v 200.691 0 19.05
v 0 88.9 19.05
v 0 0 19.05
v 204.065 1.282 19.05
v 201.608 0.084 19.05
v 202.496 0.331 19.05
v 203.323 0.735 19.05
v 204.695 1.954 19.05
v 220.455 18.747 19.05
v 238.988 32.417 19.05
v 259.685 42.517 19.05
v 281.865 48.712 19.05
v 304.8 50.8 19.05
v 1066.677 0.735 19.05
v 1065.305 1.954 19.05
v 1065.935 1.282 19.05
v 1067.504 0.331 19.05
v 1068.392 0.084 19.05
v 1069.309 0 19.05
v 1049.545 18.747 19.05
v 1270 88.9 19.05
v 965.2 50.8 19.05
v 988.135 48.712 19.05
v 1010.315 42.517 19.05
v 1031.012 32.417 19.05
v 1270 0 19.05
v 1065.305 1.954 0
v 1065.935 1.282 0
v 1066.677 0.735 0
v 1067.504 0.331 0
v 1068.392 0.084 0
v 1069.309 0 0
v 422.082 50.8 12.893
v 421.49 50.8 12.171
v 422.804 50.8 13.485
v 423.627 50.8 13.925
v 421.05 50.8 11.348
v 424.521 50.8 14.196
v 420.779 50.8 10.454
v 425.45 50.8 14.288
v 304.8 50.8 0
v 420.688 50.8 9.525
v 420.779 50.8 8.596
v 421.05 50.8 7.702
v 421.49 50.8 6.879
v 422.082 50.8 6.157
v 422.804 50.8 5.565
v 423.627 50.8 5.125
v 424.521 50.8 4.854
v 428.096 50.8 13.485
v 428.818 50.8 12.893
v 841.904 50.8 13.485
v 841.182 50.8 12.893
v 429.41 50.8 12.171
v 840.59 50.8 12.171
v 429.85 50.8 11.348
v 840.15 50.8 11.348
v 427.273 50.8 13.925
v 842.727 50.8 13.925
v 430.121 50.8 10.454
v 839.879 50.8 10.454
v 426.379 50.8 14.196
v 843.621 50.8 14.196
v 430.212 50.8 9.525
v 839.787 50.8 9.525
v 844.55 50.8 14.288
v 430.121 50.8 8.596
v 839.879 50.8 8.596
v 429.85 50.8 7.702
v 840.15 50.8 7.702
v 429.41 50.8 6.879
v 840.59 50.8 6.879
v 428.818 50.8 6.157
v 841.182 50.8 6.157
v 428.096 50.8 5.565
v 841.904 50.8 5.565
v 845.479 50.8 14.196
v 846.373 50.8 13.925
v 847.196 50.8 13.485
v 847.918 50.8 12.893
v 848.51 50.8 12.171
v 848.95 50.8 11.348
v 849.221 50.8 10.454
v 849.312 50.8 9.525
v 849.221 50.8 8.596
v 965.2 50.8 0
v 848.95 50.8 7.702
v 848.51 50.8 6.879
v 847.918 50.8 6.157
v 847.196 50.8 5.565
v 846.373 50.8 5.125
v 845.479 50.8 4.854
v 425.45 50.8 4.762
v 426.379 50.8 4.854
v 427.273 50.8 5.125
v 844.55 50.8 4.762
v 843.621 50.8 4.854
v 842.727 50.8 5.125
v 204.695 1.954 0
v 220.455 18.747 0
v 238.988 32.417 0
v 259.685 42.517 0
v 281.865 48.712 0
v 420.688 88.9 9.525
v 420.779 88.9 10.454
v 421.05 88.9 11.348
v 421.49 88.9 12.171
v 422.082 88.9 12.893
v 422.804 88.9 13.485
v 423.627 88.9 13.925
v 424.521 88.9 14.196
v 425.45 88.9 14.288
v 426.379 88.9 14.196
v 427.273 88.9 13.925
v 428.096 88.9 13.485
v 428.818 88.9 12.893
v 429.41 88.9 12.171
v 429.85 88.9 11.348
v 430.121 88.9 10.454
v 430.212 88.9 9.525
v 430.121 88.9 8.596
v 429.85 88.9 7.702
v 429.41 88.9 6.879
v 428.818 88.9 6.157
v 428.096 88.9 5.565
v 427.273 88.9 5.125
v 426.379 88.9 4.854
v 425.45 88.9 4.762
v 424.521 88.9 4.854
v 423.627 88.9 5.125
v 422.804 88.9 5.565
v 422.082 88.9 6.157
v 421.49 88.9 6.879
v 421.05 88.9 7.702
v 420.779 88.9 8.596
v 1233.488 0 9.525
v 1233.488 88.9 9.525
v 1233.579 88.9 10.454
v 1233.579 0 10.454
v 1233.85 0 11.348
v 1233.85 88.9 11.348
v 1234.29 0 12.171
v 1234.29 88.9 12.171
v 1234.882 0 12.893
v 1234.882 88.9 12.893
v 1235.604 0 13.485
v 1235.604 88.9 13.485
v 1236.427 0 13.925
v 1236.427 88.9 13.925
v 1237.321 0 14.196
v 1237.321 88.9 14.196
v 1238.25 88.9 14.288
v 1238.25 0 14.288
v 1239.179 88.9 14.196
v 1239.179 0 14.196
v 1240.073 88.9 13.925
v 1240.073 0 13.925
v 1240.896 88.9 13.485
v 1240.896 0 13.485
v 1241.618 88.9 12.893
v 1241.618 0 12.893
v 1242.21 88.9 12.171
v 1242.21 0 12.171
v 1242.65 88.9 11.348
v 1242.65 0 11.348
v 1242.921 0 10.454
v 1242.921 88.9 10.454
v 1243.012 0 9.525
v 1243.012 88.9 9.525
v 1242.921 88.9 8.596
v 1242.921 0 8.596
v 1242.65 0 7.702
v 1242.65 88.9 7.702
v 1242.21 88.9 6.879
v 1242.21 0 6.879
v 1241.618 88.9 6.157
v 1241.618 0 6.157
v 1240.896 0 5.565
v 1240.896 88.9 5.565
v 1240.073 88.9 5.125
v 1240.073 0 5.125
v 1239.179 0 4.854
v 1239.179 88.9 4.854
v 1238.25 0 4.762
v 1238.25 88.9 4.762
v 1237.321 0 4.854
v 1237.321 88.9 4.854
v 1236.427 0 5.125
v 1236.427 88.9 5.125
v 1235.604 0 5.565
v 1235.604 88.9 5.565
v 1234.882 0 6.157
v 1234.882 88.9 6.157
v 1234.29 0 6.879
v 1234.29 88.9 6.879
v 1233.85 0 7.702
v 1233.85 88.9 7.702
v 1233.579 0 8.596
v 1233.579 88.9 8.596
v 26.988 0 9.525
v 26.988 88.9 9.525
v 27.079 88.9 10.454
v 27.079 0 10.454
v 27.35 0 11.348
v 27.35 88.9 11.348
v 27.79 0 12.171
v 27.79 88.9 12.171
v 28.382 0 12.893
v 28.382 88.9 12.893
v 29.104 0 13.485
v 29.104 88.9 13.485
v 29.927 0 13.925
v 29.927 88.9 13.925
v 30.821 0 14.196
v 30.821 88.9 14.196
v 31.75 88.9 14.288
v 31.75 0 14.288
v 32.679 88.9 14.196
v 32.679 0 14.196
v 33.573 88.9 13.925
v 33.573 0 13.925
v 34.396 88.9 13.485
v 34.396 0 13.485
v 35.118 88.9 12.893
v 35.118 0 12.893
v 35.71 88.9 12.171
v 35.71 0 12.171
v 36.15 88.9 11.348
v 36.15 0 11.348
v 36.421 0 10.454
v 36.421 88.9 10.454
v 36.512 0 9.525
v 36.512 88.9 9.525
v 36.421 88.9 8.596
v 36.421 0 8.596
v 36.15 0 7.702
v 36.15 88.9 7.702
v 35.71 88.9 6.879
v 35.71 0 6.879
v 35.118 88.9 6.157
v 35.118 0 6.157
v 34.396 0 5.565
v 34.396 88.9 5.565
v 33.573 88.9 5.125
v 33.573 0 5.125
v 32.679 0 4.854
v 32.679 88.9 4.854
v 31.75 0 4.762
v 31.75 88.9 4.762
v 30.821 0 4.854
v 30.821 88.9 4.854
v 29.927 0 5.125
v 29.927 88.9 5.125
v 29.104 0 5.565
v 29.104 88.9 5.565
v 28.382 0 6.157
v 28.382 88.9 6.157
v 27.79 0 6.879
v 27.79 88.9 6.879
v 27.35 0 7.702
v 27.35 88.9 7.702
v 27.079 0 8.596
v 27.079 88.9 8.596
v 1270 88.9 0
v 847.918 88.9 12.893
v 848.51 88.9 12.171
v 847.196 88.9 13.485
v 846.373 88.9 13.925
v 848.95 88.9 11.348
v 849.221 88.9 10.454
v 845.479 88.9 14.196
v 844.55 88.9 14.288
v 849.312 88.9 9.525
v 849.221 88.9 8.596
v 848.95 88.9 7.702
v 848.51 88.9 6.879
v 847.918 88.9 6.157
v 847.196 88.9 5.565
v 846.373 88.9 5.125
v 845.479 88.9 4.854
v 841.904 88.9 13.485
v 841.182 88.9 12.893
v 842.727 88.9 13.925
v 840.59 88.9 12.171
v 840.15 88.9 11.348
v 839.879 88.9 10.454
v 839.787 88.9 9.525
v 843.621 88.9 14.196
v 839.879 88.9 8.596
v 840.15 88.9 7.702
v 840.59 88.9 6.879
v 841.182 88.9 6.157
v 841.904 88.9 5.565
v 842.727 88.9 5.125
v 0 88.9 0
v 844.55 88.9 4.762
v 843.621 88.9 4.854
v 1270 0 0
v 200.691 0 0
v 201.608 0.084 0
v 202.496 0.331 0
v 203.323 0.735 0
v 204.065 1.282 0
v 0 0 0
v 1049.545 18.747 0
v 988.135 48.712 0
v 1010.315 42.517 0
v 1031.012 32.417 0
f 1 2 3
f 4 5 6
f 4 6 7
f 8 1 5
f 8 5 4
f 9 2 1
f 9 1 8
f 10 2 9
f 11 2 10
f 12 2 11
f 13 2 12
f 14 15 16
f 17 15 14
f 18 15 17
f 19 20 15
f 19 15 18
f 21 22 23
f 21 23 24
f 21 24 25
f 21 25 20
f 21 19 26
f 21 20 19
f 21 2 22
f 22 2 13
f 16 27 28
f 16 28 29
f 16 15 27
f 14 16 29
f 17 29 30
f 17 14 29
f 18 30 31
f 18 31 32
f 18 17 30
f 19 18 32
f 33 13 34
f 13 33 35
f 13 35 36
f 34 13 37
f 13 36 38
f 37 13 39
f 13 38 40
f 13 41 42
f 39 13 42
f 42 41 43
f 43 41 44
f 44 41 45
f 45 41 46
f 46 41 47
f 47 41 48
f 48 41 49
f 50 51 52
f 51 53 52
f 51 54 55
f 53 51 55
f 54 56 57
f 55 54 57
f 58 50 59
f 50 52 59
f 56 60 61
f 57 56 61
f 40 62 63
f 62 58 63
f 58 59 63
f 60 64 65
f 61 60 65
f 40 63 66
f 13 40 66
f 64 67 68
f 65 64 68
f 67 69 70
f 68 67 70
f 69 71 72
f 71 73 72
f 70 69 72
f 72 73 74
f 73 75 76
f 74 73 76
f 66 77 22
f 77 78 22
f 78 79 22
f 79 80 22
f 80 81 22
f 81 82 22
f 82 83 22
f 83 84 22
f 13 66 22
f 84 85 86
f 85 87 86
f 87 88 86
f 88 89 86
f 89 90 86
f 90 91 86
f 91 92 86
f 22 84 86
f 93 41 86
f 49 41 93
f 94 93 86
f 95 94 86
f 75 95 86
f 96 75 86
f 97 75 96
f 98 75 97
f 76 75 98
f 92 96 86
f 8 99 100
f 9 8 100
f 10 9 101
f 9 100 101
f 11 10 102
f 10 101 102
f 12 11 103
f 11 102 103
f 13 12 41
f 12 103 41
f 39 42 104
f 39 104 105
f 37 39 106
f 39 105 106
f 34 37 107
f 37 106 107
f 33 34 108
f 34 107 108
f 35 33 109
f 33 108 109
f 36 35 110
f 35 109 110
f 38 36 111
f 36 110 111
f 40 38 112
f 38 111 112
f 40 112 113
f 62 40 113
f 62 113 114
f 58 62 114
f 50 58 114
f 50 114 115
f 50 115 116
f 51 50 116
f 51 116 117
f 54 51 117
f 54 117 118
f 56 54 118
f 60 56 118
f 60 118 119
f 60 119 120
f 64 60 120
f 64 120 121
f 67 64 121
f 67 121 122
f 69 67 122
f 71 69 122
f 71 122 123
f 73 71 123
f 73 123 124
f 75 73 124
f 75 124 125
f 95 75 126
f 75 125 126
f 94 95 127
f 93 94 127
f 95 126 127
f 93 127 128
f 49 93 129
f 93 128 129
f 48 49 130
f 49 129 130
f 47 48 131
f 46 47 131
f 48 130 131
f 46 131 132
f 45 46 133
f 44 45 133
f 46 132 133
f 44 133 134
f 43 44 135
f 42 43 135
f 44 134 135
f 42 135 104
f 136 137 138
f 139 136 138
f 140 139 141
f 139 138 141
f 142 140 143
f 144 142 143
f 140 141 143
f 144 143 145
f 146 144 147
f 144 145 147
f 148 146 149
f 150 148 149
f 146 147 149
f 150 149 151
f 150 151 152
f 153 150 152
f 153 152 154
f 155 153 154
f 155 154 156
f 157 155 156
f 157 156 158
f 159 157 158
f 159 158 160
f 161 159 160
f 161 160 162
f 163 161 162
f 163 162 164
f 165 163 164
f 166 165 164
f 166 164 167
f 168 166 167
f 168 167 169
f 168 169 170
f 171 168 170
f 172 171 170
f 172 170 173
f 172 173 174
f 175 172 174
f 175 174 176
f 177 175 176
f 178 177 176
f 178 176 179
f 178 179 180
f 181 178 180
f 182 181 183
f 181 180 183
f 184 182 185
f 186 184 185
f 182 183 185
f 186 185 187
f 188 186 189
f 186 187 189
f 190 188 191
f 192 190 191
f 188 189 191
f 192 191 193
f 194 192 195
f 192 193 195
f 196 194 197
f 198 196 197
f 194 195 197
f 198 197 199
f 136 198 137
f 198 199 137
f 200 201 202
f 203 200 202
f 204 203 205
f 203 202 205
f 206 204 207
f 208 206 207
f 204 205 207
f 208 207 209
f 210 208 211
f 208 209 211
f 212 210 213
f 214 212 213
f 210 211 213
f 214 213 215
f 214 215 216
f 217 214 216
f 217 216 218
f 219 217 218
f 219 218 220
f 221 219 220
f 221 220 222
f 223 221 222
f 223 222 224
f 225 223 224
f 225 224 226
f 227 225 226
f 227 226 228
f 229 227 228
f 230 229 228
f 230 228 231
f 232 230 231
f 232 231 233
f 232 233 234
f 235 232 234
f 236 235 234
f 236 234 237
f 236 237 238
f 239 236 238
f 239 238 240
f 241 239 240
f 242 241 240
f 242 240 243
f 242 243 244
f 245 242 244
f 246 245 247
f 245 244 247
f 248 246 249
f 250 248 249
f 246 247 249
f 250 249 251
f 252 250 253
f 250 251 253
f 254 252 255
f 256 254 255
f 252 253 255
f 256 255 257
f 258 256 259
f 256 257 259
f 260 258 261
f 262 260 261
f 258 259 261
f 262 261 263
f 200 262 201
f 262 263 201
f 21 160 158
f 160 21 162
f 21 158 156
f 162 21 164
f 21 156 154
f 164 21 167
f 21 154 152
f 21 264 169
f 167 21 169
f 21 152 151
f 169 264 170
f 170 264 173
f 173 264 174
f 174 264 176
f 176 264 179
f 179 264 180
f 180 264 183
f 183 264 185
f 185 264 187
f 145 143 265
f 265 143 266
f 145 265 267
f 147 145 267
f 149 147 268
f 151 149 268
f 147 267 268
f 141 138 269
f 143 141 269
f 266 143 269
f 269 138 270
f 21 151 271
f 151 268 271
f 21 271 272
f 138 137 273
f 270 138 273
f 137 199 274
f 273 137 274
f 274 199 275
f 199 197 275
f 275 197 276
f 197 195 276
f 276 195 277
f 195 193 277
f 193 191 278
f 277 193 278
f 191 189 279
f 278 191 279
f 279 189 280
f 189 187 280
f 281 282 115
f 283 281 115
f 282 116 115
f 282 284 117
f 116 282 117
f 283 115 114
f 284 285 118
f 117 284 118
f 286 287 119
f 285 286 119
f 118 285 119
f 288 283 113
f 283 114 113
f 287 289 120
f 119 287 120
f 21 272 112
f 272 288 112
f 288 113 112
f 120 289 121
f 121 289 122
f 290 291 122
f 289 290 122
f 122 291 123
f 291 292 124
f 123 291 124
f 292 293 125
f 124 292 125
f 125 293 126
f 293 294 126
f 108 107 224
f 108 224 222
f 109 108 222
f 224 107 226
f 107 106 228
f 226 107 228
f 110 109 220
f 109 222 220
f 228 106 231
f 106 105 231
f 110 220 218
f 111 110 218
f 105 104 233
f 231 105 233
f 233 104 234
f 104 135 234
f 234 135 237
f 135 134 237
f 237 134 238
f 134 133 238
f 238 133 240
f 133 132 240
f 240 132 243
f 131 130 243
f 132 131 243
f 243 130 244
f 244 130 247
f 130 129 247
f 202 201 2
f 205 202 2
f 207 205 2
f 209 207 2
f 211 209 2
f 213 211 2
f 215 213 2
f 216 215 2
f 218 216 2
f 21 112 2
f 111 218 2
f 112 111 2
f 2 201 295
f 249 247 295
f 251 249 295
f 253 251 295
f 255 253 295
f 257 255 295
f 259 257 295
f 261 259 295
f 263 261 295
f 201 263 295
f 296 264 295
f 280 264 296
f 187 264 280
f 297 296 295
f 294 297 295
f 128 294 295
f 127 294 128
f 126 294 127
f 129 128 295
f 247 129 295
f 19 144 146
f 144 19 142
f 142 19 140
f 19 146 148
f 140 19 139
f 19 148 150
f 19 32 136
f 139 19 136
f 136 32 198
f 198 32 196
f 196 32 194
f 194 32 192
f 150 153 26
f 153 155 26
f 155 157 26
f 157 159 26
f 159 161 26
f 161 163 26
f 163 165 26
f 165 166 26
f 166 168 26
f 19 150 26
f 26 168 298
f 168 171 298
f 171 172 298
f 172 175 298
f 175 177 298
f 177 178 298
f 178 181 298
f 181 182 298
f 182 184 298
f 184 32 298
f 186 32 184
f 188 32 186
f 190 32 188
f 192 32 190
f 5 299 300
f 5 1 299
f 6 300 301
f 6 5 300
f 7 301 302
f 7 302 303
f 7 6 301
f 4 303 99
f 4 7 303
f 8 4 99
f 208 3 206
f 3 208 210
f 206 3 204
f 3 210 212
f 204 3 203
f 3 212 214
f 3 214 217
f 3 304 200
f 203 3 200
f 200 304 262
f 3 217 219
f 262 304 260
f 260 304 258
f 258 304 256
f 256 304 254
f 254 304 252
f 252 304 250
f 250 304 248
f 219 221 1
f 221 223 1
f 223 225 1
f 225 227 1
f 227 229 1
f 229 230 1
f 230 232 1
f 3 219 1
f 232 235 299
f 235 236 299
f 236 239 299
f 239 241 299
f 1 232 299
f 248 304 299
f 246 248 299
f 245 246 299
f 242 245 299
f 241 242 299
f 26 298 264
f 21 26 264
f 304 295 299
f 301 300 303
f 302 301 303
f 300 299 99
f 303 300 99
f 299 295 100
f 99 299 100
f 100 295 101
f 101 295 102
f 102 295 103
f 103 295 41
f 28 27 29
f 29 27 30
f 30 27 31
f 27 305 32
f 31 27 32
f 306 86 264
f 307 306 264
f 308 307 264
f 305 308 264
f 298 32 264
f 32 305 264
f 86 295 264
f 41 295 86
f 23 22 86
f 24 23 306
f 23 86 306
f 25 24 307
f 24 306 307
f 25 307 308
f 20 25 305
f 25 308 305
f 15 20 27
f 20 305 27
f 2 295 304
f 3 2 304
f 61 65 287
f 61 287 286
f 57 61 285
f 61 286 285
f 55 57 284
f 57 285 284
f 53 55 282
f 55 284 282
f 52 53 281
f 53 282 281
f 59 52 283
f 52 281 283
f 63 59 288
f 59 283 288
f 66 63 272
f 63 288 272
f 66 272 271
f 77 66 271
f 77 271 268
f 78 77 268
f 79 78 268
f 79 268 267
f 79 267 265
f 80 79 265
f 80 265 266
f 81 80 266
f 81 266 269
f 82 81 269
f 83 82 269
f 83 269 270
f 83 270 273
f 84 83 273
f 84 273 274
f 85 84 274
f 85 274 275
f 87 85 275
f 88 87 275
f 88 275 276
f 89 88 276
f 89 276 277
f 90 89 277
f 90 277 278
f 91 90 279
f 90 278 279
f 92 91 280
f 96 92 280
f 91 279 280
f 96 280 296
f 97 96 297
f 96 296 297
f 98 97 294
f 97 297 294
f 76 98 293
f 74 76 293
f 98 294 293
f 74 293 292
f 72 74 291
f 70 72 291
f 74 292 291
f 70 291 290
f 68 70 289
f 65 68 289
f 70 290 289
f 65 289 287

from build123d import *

# Parameters (mm, degrees)
F1_DEPTH = 19.05
F3_D     = 9.525
F4_R     = 5.08


with BuildPart() as f1:
    # F0 (on Top) → F1 (new body)
    with BuildSketch(Plane.XY):
        with BuildLine():
            Line((0, 88.9), (0, 0))
            Line((0, 0), (203.2, 0))
            ThreePointArc((203.2, 0), (248.003873, 37.392253), (304.8, 50.8))
            Line((304.8, 50.8), (965.2, 50.8))
            ThreePointArc((965.2, 50.8), (1021.996127, 37.392253), (1066.8, 0))
            Line((1066.8, 0), (1270, 0))
            Line((1270, 0), (1270, 88.9))
            Line((1270, 88.9), (0, 88.9))
        make_face()
    extrude(amount=F1_DEPTH)

    # F3 (through all)
    with Locations(Plane.XZ):
        with Locations((31.75, 9.525), (425.45, 9.525), (844.55, 9.525), (1238.25, 9.525)):
            Hole(F3_D / 2)

    # F4
    f4_edges = [f1.edges().sort_by_distance(p)[0] for p in [
        (203.2, 0, 9.525),
        (1066.8, 0, 9.525),
    ]]
    fillet(f4_edges, radius=F4_R)


solid = f1.part
